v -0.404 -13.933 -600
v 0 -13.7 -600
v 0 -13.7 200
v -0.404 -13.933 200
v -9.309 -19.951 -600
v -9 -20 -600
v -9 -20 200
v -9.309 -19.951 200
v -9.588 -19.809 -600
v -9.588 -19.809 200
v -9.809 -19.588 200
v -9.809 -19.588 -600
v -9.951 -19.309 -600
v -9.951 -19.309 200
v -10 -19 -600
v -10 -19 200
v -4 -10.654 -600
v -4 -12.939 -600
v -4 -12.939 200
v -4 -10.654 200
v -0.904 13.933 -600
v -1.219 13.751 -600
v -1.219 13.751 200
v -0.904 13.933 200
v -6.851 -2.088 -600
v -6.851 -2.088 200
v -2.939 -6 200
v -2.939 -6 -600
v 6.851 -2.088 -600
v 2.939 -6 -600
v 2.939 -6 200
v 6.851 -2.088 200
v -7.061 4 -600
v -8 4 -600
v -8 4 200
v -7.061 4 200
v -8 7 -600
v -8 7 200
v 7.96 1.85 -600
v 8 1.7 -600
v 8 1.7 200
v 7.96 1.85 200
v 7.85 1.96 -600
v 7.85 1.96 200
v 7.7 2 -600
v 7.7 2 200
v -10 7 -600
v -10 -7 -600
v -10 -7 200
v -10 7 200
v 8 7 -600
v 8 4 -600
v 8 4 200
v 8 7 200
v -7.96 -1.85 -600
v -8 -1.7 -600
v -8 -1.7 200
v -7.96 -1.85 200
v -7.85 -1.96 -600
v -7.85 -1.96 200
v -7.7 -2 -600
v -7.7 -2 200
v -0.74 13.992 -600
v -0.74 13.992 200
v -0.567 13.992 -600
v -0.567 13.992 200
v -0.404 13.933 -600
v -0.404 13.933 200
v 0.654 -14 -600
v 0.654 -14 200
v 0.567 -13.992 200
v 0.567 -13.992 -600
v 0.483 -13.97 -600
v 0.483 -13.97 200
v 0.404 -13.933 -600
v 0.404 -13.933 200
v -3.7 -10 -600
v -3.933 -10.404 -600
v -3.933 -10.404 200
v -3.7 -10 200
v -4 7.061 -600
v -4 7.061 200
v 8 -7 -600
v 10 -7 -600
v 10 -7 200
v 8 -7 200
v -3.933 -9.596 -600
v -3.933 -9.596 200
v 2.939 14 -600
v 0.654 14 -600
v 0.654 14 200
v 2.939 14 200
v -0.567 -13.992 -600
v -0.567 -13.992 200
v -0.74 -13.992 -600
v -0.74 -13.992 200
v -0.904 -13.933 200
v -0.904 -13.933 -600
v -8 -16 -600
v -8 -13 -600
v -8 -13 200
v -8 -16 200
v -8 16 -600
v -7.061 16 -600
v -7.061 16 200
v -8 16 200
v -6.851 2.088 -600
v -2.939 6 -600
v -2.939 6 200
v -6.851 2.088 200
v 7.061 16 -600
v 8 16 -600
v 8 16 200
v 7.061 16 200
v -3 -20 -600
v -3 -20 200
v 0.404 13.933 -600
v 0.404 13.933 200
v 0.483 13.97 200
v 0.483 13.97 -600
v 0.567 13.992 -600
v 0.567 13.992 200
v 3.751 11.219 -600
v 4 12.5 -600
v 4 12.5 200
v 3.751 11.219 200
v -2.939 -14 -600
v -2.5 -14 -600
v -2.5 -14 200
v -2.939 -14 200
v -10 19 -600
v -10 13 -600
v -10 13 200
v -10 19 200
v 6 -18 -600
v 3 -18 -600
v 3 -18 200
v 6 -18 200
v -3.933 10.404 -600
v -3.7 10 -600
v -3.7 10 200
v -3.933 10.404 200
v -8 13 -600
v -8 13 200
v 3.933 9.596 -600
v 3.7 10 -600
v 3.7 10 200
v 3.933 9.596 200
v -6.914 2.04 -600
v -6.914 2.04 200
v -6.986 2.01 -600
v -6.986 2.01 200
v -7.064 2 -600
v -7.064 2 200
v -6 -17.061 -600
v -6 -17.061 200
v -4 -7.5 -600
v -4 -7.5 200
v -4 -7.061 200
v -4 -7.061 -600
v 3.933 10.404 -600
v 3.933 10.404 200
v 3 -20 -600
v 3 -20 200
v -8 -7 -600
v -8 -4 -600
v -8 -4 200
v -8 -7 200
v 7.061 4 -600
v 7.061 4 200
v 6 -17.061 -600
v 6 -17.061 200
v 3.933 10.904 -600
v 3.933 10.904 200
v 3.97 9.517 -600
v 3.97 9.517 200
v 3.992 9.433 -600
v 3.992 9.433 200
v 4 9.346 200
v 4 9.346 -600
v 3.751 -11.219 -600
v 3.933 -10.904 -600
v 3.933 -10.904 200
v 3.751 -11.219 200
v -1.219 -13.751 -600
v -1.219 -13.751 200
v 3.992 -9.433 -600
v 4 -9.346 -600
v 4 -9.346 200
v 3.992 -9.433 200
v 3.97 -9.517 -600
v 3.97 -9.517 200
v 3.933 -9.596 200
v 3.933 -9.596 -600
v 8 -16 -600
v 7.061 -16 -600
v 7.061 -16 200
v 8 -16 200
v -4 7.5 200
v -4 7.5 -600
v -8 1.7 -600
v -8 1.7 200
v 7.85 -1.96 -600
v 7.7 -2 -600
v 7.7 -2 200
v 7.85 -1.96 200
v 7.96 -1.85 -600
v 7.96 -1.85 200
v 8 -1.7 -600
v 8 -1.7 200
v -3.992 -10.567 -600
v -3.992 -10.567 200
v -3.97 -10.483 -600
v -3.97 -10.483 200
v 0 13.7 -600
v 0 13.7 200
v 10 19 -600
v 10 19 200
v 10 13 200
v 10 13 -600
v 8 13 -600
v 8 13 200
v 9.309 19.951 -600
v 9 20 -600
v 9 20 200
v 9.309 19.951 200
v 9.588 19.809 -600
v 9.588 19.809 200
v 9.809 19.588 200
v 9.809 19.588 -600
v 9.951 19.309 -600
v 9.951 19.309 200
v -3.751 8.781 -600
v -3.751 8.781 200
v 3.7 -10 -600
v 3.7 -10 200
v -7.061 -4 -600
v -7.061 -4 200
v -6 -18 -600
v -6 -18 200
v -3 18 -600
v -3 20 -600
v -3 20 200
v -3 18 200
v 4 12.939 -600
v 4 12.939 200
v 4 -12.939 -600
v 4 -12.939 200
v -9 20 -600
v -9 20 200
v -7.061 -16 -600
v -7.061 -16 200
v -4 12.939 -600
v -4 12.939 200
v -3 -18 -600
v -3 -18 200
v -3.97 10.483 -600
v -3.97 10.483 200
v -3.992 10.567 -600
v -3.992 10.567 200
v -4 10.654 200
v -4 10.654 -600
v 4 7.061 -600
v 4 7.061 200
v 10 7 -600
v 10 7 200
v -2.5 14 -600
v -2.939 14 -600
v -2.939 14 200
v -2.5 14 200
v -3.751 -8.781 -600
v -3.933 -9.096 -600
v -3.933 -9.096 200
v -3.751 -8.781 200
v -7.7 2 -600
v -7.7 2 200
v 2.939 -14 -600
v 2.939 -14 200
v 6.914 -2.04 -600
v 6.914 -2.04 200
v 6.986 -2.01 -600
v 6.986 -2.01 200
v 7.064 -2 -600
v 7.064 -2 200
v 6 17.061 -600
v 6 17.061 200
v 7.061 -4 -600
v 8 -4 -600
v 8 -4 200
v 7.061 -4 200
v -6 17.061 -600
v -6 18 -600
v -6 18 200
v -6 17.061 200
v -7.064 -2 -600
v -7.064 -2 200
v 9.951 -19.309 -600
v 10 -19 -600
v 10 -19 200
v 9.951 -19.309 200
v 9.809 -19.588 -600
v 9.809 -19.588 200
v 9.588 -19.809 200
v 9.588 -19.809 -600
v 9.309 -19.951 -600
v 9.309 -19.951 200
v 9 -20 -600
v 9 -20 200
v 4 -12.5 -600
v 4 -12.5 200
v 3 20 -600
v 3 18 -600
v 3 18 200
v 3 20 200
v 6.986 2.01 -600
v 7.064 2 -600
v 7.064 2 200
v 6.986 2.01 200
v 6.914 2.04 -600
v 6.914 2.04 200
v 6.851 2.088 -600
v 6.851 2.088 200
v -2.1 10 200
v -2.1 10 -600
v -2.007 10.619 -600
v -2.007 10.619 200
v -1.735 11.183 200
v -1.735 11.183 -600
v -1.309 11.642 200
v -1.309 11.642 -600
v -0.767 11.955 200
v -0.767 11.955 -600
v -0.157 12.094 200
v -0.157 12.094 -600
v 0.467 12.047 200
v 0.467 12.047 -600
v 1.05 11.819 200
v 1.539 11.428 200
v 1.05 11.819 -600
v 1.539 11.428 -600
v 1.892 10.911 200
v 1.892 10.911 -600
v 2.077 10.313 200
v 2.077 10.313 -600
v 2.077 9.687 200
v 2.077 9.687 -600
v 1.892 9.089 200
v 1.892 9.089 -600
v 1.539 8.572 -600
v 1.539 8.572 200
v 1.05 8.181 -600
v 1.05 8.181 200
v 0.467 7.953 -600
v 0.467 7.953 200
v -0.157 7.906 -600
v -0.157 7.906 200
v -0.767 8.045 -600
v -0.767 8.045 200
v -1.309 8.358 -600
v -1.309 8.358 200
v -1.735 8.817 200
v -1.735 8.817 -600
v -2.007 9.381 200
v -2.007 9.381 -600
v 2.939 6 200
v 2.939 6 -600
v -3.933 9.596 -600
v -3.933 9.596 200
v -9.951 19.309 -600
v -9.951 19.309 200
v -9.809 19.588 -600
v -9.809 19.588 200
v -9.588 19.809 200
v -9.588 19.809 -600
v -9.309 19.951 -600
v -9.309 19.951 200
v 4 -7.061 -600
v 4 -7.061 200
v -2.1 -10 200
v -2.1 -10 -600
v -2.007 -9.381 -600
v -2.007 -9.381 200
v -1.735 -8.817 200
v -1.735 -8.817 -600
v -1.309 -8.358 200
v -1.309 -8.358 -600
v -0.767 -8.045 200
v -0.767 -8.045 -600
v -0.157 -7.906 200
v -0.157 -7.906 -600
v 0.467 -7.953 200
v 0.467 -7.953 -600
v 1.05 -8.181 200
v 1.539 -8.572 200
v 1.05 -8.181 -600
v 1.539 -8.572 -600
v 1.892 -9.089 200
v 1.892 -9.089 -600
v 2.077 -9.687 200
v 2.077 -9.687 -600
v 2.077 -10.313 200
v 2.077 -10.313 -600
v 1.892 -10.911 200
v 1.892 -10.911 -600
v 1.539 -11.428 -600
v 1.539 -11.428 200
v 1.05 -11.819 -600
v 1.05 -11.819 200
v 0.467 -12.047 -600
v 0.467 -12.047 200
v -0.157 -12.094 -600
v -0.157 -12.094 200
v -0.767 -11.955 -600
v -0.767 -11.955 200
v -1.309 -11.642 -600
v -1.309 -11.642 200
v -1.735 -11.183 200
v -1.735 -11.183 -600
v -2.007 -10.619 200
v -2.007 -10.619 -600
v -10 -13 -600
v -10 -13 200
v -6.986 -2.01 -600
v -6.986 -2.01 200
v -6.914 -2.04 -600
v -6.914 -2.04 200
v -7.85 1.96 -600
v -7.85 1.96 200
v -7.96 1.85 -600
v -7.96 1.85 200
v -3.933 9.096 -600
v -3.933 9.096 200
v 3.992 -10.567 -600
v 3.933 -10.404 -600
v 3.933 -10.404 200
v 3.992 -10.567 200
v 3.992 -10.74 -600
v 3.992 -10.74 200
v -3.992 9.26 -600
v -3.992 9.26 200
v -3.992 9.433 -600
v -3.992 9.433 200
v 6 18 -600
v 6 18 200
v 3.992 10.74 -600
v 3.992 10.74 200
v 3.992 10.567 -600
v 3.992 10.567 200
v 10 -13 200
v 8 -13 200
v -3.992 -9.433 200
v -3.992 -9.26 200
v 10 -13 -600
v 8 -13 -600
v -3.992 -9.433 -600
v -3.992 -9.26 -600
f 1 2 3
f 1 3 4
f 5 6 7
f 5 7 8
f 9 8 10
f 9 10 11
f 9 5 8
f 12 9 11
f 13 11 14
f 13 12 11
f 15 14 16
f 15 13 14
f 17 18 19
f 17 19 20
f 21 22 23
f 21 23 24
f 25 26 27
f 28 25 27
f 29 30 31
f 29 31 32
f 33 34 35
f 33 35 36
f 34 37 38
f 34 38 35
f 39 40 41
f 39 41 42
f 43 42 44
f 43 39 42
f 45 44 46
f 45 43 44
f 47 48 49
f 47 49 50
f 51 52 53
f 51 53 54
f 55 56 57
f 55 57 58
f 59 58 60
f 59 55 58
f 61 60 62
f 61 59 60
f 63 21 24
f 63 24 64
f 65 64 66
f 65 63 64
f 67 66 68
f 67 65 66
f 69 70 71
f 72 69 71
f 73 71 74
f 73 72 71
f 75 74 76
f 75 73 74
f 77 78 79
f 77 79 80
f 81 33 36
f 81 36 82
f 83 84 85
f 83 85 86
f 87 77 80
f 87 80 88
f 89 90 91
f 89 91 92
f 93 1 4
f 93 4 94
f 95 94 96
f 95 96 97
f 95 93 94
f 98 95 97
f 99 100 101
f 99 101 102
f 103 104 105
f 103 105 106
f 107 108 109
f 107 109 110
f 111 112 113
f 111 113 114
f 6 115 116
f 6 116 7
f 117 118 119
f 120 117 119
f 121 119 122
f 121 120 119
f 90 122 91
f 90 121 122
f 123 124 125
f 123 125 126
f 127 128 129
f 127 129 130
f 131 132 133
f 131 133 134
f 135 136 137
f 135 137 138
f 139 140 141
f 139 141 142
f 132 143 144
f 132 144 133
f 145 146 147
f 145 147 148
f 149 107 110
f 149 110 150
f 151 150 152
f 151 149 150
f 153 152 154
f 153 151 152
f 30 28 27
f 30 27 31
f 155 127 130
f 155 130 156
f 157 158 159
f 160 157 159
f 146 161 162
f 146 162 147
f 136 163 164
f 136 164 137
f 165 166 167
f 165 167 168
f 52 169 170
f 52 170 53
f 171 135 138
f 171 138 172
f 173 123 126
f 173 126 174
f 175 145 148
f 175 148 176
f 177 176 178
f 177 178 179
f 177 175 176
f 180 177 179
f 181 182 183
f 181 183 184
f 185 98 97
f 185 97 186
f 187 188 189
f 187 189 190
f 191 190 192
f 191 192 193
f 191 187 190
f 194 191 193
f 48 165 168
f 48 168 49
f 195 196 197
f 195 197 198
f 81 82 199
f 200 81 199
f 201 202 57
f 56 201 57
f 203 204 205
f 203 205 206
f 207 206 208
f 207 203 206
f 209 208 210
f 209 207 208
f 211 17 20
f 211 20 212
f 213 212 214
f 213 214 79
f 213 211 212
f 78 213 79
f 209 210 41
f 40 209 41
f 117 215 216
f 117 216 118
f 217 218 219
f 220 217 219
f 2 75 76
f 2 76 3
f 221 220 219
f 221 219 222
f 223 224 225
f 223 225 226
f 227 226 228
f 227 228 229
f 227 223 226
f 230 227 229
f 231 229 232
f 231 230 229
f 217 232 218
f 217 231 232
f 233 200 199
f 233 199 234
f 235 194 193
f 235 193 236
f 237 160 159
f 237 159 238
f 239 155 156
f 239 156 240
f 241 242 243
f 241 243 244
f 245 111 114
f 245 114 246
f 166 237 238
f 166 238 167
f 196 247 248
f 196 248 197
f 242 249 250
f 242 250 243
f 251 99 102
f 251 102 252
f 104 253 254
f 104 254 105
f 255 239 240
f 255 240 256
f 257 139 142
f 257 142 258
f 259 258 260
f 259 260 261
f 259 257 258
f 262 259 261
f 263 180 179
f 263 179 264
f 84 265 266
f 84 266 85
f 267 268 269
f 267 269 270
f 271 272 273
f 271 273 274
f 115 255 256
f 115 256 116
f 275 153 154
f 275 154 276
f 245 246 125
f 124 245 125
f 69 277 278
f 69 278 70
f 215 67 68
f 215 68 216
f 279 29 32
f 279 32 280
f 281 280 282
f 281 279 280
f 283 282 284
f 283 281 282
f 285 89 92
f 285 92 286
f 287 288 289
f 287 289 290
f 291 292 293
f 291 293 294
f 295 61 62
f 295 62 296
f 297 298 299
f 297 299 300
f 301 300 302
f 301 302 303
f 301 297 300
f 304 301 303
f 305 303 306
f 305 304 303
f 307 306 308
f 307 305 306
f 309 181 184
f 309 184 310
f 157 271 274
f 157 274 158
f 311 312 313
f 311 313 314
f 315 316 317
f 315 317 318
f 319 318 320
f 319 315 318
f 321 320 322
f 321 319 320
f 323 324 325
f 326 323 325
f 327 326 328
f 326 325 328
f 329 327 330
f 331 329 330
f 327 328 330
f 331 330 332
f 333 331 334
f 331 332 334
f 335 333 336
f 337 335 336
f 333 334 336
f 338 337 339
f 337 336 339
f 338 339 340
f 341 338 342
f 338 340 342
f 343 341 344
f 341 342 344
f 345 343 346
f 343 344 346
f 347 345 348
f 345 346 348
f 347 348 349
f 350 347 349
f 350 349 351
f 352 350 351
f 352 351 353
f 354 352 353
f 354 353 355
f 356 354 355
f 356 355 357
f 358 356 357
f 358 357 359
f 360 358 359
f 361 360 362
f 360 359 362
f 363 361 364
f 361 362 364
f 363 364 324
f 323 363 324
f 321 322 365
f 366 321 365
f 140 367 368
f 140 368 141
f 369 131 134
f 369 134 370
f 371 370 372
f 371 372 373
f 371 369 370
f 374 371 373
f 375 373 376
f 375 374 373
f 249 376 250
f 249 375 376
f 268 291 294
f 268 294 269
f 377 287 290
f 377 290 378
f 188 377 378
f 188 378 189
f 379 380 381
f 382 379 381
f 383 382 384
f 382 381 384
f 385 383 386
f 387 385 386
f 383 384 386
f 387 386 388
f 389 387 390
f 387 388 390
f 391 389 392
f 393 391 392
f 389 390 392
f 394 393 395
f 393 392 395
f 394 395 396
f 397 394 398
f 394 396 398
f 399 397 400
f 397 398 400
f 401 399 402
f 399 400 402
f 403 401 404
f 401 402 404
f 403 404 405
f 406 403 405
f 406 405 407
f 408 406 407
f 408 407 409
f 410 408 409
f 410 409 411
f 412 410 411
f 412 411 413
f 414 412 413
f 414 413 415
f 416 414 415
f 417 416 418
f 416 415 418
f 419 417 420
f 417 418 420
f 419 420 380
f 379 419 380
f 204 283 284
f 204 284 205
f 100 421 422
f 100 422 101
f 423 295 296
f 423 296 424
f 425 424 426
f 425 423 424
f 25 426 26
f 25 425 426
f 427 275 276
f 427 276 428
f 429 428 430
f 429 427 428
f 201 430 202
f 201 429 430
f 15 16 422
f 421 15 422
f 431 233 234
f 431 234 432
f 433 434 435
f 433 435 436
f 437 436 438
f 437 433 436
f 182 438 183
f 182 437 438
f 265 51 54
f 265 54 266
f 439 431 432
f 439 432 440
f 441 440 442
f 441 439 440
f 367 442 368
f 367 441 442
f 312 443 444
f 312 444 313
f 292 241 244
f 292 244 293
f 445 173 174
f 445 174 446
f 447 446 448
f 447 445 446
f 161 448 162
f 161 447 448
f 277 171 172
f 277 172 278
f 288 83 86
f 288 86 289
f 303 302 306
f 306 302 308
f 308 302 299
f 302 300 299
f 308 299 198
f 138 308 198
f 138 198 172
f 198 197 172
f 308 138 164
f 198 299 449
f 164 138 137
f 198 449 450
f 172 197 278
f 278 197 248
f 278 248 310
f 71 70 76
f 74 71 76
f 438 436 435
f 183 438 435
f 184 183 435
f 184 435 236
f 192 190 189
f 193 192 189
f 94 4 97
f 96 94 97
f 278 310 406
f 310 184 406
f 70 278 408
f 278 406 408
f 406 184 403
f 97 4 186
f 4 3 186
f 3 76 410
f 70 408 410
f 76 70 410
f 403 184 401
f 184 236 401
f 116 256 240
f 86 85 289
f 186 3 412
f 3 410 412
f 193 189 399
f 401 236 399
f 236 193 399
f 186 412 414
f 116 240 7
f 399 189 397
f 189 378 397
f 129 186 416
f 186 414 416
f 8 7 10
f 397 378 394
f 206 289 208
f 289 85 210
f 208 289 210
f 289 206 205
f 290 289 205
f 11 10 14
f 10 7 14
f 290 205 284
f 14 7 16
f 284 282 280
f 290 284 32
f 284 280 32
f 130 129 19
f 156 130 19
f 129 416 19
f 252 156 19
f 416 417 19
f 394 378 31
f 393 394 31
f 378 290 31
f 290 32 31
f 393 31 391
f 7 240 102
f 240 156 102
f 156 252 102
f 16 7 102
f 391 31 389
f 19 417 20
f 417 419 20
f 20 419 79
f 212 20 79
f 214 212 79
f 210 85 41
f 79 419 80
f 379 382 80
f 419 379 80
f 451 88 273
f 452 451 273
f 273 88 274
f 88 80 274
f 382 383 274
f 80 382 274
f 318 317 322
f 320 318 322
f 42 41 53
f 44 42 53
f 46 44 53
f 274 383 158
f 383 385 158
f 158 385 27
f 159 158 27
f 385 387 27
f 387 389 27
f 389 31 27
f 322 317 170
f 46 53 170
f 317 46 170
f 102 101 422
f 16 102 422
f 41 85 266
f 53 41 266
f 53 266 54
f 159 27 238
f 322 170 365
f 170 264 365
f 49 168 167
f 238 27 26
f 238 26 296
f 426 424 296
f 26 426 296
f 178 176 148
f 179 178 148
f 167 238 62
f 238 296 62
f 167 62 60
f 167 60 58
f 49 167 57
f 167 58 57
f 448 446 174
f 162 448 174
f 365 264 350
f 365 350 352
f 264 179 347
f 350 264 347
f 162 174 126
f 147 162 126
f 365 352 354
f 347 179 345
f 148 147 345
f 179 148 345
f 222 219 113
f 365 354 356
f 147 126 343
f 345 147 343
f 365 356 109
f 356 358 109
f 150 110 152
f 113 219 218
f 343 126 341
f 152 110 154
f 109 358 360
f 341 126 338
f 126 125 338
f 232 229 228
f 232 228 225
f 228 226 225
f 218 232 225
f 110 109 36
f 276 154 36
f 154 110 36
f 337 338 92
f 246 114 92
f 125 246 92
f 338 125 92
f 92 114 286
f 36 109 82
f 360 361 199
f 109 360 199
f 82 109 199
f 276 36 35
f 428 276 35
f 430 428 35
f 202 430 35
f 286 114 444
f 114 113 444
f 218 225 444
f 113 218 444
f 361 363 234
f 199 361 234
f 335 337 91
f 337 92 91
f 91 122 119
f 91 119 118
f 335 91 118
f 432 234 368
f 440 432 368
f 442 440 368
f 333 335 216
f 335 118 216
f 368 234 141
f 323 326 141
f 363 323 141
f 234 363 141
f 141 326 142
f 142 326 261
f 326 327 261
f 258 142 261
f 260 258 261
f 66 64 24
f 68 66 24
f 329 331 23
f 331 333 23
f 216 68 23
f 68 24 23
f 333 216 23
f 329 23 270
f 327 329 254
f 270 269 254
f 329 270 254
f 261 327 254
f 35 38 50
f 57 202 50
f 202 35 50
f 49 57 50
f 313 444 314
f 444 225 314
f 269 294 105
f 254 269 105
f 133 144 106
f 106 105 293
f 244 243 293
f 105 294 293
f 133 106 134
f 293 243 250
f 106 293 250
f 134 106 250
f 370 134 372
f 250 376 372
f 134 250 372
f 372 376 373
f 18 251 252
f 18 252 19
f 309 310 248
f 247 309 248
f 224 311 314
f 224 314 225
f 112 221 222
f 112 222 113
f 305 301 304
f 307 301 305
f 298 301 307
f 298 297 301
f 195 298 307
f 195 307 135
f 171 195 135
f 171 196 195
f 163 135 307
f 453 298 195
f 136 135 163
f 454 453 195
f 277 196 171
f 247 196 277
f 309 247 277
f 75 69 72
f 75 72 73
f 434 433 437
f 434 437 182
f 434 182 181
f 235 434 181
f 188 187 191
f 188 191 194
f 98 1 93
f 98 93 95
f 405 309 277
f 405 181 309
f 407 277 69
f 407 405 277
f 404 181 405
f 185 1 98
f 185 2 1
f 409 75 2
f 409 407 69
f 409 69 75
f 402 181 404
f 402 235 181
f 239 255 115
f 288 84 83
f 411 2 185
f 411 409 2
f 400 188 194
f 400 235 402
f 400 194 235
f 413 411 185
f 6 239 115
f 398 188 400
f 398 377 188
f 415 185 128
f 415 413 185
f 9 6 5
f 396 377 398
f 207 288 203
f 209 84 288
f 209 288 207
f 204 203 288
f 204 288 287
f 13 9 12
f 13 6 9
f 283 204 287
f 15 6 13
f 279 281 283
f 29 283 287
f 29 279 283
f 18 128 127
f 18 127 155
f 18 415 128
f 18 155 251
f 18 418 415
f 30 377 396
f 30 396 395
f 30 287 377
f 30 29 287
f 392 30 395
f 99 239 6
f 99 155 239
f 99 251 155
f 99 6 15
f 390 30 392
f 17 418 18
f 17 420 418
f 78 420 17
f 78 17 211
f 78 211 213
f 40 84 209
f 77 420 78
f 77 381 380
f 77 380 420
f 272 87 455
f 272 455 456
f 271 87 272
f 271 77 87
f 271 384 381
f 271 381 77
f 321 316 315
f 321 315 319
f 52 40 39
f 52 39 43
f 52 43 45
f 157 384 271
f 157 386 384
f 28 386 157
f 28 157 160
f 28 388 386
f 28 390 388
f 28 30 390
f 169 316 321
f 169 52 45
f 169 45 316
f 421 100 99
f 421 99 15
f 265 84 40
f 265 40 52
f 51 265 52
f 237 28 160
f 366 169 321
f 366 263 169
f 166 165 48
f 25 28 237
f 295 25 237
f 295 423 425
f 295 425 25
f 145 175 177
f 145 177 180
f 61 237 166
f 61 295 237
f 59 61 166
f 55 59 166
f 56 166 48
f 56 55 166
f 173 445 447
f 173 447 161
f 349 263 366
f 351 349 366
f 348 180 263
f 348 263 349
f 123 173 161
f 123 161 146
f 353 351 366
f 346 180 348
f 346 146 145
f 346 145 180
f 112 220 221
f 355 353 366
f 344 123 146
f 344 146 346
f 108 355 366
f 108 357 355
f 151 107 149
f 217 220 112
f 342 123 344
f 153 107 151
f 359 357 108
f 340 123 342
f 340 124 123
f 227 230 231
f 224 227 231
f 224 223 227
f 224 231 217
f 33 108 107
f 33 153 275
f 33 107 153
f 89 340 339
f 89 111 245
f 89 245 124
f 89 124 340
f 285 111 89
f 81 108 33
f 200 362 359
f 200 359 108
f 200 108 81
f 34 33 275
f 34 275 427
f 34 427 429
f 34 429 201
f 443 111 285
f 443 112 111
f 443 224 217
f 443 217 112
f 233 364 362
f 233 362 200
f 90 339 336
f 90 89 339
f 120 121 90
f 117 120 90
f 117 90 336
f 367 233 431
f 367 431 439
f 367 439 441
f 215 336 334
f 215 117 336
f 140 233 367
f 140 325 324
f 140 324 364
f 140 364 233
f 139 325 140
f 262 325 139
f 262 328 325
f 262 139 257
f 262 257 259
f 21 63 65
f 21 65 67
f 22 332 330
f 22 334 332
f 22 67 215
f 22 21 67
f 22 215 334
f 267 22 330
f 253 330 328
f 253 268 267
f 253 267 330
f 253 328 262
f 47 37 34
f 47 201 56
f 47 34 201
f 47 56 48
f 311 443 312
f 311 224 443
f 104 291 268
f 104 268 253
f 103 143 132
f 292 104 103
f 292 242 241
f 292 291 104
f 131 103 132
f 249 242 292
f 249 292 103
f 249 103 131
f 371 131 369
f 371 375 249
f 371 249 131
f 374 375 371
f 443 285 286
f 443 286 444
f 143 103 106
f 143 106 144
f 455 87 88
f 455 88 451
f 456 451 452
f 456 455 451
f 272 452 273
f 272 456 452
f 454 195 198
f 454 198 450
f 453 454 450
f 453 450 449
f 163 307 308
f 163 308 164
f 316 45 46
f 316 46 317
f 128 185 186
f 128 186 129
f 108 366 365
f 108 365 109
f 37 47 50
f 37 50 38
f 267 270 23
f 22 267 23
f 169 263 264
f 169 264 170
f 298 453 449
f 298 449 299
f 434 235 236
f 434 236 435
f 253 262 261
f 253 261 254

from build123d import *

# Parameters (mm, degrees)
SKETCH1_R           = 2.1
BOSS_EXTRUDE1_DEPTH = 800


with BuildPart() as part:
    # Sketch1 → Boss-Extrude1 (new body)
    with BuildSketch(Plane(origin=(0, 0, -600), x_dir=(-1, 0, 0), z_dir=(0, 0, -1))):
        with BuildLine():
            Line((10, -7), (10, 7))
            Line((10, 7), (8, 7))
            Line((8, 7), (8, 4))
            Line((8, 4), (7.060660172, 4))
            Line((7.060660172, 4), (4, 7.060660172))
            Line((4, 7.060660172), (4, 7.5))
            Line((4, 7.5), (3.750976592, 8.781114371))
            Line((3.750976592, 8.781114371), (3.933012702, 9.096410162))
            ThreePointArc((3.933012702, 9.096410162), (4, 9.346410162), (3.933012702, 9.596410162))
            Line((3.933012702, 9.596410162), (3.7, 10))
            Line((3.7, 10), (3.933012702, 10.403589838))
            ThreePointArc((3.933012702, 10.403589838), (3.982962913, 10.524180316), (4, 10.653589838))
            Line((4, 10.653589838), (4, 12.939339828))
            Line((4, 12.939339828), (7.060660172, 16))
            Line((7.060660172, 16), (8, 16))
            Line((8, 16), (8, 13))
            Line((8, 13), (10, 13))
            Line((10, 13), (10, 19))
            ThreePointArc((10, 19), (9.707106781, 19.707106781), (9, 20))
            Line((9, 20), (3, 20))
            Line((3, 20), (3, 18))
            Line((3, 18), (6, 18))
            Line((6, 18), (6, 17.060660172))
            Line((6, 17.060660172), (2.939339828, 14))
            Line((2.939339828, 14), (2.5, 14))
            Line((2.5, 14), (1.218885629, 13.750976592))
            Line((1.218885629, 13.750976592), (0.903589838, 13.933012702))
            ThreePointArc((0.903589838, 13.933012702), (0.653589838, 14), (0.403589838, 13.933012702))
            Line((0.403589838, 13.933012702), (0, 13.7))
            Line((0, 13.7), (-0.403589838, 13.933012702))
            ThreePointArc((-0.403589838, 13.933012702), (-0.524180316, 13.982962913), (-0.653589838, 14))
            Line((-0.653589838, 14), (-2.939339828, 14))
            Line((-2.939339828, 14), (-6, 17.060660172))
            Line((-6, 17.060660172), (-6, 18))
            Line((-6, 18), (-3, 18))
            Line((-3, 18), (-3, 20))
            Line((-3, 20), (-9, 20))
            ThreePointArc((-9, 20), (-9.707106781, 19.707106781), (-10, 19))
            Line((-10, 19), (-10, 13))
            Line((-10, 13), (-8, 13))
            Line((-8, 13), (-8, 16))
            Line((-8, 16), (-7.060660172, 16))
            Line((-7.060660172, 16), (-4, 12.939339828))
            Line((-4, 12.939339828), (-4, 12.5))
            Line((-4, 12.5), (-3.750976592, 11.218885629))
            Line((-3.750976592, 11.218885629), (-3.933012702, 10.903589838))
            ThreePointArc((-3.933012702, 10.903589838), (-4, 10.653589838), (-3.933012702, 10.403589838))
            Line((-3.933012702, 10.403589838), (-3.7, 10))
            Line((-3.7, 10), (-3.933012702, 9.596410162))
            ThreePointArc((-3.933012702, 9.596410162), (-3.982962913, 9.475819684), (-4, 9.346410162))
            Line((-4, 9.346410162), (-4, 7.060660172))
            Line((-4, 7.060660172), (-7.060660172, 4))
            Line((-7.060660172, 4), (-8, 4))
            Line((-8, 4), (-8, 7))
            Line((-8, 7), (-10, 7))
            Line((-10, 7), (-10, -7))
            Line((-10, -7), (-8, -7))
            Line((-8, -7), (-8, -4))
            Line((-8, -4), (-7.060660172, -4))
            Line((-7.060660172, -4), (-4, -7.060660172))
            Line((-4, -7.060660172), (-4, -9.346410162))
            ThreePointArc((-4, -9.346410162), (-3.982962913, -9.475819684), (-3.933012702, -9.596410162))
            Line((-3.933012702, -9.596410162), (-3.7, -10))
            Line((-3.7, -10), (-3.933012702, -10.403589838))
            ThreePointArc((-3.933012702, -10.403589838), (-4, -10.653589838), (-3.933012702, -10.903589838))
            Line((-3.933012702, -10.903589838), (-3.750976592, -11.218885629))
            Line((-3.750976592, -11.218885629), (-4, -12.5))
            Line((-4, -12.5), (-4, -12.939339828))
            Line((-4, -12.939339828), (-7.060660172, -16))
            Line((-7.060660172, -16), (-8, -16))
            Line((-8, -16), (-8, -13))
            Line((-8, -13), (-10, -13))
            Line((-10, -13), (-10, -19))
            ThreePointArc((-10, -19), (-9.707106781, -19.707106781), (-9, -20))
            Line((-9, -20), (-3, -20))
            Line((-3, -20), (-3, -18))
            Line((-3, -18), (-6, -18))
            Line((-6, -18), (-6, -17.060660172))
            Line((-6, -17.060660172), (-2.939339828, -14))
            Line((-2.939339828, -14), (-0.653589838, -14))
            ThreePointArc((-0.653589838, -14), (-0.524180316, -13.982962913), (-0.403589838, -13.933012702))
            Line((-0.403589838, -13.933012702), (0, -13.7))
            Line((0, -13.7), (0.403589839, -13.933012702))
            ThreePointArc((0.403589839, -13.933012702), (0.653589839, -14), (0.903589838, -13.933012702))
            Line((0.903589838, -13.933012702), (1.218885629, -13.750976592))
            Line((1.218885629, -13.750976592), (2.5, -14))
            Line((2.5, -14), (2.939339828, -14))
            Line((2.939339828, -14), (6, -17.060660172))
            Line((6, -17.060660172), (6, -18))
            Line((6, -18), (3, -18))
            Line((3, -18), (3, -20))
            Line((3, -20), (9, -20))
            ThreePointArc((9, -20), (9.707106781, -19.707106781), (10, -19))
            Line((10, -19), (10, -13))
            Line((10, -13), (8, -13))
            Line((8, -13), (8, -16))
            Line((8, -16), (7.060660172, -16))
            Line((7.060660172, -16), (4, -12.939339828))
            Line((4, -12.939339828), (4, -10.653589838))
            ThreePointArc((4, -10.653589838), (3.982962913, -10.524180316), (3.933012702, -10.403589838))
            Line((3.933012702, -10.403589838), (3.7, -10))
            Line((3.7, -10), (3.933012702, -9.596410162))
            ThreePointArc((3.933012702, -9.596410162), (4, -9.346410162), (3.933012702, -9.096410162))
            Line((3.933012702, -9.096410162), (3.750976592, -8.781114371))
            Line((3.750976592, -8.781114371), (4, -7.5))
            Line((4, -7.5), (4, -7.060660172))
            Line((4, -7.060660172), (7.060660172, -4))
            Line((7.060660172, -4), (8, -4))
            Line((8, -4), (8, -7))
            Line((8, -7), (10, -7))
        make_face()
        with Locations((0, -10)):
            Circle(SKETCH1_R, mode=Mode.SUBTRACT)
        with Locations((0, 10)):
            Circle(SKETCH1_R, mode=Mode.SUBTRACT)
        with BuildLine():
            Line((8, 1.7), (8, -1.7))
            ThreePointArc((8, -1.7), (7.912132034, -1.912132034), (7.7, -2))
            Line((7.7, -2), (7.063603897, -2))
            ThreePointArc((7.063603897, -2), (6.948798867, -2.02283614), (6.851471863, -2.087867966))
            Line((6.851471863, -2.087867966), (2.939339828, -6))
            Line((2.939339828, -6), (-2.939339828, -6))
            Line((-2.939339828, -6), (-6.851471863, -2.087867966))
            ThreePointArc((-6.851471863, -2.087867966), (-6.948798867, -2.02283614), (-7.063603897, -2))
            Line((-7.063603897, -2), (-7.7, -2))
            ThreePointArc((-7.7, -2), (-7.912132034, -1.912132034), (-8, -1.7))
            Line((-8, -1.7), (-8, 1.7))
            ThreePointArc((-8, 1.7), (-7.912132034, 1.912132034), (-7.7, 2))
            Line((-7.7, 2), (-7.063603897, 2))
            ThreePointArc((-7.063603897, 2), (-6.948798867, 2.02283614), (-6.851471863, 2.087867966))
            Line((-6.851471863, 2.087867966), (-2.939339828, 6))
            Line((-2.939339828, 6), (2.939339828, 6))
            Line((2.939339828, 6), (6.851471863, 2.087867966))
            ThreePointArc((6.851471863, 2.087867966), (6.948798867, 2.02283614), (7.063603897, 2))
            Line((7.063603897, 2), (7.7, 2))
            ThreePointArc((7.7, 2), (7.912132034, 1.912132034), (8, 1.7))
        make_face(mode=Mode.SUBTRACT)
    extrude(amount=-BOSS_EXTRUDE1_DEPTH)


solid = part.part
